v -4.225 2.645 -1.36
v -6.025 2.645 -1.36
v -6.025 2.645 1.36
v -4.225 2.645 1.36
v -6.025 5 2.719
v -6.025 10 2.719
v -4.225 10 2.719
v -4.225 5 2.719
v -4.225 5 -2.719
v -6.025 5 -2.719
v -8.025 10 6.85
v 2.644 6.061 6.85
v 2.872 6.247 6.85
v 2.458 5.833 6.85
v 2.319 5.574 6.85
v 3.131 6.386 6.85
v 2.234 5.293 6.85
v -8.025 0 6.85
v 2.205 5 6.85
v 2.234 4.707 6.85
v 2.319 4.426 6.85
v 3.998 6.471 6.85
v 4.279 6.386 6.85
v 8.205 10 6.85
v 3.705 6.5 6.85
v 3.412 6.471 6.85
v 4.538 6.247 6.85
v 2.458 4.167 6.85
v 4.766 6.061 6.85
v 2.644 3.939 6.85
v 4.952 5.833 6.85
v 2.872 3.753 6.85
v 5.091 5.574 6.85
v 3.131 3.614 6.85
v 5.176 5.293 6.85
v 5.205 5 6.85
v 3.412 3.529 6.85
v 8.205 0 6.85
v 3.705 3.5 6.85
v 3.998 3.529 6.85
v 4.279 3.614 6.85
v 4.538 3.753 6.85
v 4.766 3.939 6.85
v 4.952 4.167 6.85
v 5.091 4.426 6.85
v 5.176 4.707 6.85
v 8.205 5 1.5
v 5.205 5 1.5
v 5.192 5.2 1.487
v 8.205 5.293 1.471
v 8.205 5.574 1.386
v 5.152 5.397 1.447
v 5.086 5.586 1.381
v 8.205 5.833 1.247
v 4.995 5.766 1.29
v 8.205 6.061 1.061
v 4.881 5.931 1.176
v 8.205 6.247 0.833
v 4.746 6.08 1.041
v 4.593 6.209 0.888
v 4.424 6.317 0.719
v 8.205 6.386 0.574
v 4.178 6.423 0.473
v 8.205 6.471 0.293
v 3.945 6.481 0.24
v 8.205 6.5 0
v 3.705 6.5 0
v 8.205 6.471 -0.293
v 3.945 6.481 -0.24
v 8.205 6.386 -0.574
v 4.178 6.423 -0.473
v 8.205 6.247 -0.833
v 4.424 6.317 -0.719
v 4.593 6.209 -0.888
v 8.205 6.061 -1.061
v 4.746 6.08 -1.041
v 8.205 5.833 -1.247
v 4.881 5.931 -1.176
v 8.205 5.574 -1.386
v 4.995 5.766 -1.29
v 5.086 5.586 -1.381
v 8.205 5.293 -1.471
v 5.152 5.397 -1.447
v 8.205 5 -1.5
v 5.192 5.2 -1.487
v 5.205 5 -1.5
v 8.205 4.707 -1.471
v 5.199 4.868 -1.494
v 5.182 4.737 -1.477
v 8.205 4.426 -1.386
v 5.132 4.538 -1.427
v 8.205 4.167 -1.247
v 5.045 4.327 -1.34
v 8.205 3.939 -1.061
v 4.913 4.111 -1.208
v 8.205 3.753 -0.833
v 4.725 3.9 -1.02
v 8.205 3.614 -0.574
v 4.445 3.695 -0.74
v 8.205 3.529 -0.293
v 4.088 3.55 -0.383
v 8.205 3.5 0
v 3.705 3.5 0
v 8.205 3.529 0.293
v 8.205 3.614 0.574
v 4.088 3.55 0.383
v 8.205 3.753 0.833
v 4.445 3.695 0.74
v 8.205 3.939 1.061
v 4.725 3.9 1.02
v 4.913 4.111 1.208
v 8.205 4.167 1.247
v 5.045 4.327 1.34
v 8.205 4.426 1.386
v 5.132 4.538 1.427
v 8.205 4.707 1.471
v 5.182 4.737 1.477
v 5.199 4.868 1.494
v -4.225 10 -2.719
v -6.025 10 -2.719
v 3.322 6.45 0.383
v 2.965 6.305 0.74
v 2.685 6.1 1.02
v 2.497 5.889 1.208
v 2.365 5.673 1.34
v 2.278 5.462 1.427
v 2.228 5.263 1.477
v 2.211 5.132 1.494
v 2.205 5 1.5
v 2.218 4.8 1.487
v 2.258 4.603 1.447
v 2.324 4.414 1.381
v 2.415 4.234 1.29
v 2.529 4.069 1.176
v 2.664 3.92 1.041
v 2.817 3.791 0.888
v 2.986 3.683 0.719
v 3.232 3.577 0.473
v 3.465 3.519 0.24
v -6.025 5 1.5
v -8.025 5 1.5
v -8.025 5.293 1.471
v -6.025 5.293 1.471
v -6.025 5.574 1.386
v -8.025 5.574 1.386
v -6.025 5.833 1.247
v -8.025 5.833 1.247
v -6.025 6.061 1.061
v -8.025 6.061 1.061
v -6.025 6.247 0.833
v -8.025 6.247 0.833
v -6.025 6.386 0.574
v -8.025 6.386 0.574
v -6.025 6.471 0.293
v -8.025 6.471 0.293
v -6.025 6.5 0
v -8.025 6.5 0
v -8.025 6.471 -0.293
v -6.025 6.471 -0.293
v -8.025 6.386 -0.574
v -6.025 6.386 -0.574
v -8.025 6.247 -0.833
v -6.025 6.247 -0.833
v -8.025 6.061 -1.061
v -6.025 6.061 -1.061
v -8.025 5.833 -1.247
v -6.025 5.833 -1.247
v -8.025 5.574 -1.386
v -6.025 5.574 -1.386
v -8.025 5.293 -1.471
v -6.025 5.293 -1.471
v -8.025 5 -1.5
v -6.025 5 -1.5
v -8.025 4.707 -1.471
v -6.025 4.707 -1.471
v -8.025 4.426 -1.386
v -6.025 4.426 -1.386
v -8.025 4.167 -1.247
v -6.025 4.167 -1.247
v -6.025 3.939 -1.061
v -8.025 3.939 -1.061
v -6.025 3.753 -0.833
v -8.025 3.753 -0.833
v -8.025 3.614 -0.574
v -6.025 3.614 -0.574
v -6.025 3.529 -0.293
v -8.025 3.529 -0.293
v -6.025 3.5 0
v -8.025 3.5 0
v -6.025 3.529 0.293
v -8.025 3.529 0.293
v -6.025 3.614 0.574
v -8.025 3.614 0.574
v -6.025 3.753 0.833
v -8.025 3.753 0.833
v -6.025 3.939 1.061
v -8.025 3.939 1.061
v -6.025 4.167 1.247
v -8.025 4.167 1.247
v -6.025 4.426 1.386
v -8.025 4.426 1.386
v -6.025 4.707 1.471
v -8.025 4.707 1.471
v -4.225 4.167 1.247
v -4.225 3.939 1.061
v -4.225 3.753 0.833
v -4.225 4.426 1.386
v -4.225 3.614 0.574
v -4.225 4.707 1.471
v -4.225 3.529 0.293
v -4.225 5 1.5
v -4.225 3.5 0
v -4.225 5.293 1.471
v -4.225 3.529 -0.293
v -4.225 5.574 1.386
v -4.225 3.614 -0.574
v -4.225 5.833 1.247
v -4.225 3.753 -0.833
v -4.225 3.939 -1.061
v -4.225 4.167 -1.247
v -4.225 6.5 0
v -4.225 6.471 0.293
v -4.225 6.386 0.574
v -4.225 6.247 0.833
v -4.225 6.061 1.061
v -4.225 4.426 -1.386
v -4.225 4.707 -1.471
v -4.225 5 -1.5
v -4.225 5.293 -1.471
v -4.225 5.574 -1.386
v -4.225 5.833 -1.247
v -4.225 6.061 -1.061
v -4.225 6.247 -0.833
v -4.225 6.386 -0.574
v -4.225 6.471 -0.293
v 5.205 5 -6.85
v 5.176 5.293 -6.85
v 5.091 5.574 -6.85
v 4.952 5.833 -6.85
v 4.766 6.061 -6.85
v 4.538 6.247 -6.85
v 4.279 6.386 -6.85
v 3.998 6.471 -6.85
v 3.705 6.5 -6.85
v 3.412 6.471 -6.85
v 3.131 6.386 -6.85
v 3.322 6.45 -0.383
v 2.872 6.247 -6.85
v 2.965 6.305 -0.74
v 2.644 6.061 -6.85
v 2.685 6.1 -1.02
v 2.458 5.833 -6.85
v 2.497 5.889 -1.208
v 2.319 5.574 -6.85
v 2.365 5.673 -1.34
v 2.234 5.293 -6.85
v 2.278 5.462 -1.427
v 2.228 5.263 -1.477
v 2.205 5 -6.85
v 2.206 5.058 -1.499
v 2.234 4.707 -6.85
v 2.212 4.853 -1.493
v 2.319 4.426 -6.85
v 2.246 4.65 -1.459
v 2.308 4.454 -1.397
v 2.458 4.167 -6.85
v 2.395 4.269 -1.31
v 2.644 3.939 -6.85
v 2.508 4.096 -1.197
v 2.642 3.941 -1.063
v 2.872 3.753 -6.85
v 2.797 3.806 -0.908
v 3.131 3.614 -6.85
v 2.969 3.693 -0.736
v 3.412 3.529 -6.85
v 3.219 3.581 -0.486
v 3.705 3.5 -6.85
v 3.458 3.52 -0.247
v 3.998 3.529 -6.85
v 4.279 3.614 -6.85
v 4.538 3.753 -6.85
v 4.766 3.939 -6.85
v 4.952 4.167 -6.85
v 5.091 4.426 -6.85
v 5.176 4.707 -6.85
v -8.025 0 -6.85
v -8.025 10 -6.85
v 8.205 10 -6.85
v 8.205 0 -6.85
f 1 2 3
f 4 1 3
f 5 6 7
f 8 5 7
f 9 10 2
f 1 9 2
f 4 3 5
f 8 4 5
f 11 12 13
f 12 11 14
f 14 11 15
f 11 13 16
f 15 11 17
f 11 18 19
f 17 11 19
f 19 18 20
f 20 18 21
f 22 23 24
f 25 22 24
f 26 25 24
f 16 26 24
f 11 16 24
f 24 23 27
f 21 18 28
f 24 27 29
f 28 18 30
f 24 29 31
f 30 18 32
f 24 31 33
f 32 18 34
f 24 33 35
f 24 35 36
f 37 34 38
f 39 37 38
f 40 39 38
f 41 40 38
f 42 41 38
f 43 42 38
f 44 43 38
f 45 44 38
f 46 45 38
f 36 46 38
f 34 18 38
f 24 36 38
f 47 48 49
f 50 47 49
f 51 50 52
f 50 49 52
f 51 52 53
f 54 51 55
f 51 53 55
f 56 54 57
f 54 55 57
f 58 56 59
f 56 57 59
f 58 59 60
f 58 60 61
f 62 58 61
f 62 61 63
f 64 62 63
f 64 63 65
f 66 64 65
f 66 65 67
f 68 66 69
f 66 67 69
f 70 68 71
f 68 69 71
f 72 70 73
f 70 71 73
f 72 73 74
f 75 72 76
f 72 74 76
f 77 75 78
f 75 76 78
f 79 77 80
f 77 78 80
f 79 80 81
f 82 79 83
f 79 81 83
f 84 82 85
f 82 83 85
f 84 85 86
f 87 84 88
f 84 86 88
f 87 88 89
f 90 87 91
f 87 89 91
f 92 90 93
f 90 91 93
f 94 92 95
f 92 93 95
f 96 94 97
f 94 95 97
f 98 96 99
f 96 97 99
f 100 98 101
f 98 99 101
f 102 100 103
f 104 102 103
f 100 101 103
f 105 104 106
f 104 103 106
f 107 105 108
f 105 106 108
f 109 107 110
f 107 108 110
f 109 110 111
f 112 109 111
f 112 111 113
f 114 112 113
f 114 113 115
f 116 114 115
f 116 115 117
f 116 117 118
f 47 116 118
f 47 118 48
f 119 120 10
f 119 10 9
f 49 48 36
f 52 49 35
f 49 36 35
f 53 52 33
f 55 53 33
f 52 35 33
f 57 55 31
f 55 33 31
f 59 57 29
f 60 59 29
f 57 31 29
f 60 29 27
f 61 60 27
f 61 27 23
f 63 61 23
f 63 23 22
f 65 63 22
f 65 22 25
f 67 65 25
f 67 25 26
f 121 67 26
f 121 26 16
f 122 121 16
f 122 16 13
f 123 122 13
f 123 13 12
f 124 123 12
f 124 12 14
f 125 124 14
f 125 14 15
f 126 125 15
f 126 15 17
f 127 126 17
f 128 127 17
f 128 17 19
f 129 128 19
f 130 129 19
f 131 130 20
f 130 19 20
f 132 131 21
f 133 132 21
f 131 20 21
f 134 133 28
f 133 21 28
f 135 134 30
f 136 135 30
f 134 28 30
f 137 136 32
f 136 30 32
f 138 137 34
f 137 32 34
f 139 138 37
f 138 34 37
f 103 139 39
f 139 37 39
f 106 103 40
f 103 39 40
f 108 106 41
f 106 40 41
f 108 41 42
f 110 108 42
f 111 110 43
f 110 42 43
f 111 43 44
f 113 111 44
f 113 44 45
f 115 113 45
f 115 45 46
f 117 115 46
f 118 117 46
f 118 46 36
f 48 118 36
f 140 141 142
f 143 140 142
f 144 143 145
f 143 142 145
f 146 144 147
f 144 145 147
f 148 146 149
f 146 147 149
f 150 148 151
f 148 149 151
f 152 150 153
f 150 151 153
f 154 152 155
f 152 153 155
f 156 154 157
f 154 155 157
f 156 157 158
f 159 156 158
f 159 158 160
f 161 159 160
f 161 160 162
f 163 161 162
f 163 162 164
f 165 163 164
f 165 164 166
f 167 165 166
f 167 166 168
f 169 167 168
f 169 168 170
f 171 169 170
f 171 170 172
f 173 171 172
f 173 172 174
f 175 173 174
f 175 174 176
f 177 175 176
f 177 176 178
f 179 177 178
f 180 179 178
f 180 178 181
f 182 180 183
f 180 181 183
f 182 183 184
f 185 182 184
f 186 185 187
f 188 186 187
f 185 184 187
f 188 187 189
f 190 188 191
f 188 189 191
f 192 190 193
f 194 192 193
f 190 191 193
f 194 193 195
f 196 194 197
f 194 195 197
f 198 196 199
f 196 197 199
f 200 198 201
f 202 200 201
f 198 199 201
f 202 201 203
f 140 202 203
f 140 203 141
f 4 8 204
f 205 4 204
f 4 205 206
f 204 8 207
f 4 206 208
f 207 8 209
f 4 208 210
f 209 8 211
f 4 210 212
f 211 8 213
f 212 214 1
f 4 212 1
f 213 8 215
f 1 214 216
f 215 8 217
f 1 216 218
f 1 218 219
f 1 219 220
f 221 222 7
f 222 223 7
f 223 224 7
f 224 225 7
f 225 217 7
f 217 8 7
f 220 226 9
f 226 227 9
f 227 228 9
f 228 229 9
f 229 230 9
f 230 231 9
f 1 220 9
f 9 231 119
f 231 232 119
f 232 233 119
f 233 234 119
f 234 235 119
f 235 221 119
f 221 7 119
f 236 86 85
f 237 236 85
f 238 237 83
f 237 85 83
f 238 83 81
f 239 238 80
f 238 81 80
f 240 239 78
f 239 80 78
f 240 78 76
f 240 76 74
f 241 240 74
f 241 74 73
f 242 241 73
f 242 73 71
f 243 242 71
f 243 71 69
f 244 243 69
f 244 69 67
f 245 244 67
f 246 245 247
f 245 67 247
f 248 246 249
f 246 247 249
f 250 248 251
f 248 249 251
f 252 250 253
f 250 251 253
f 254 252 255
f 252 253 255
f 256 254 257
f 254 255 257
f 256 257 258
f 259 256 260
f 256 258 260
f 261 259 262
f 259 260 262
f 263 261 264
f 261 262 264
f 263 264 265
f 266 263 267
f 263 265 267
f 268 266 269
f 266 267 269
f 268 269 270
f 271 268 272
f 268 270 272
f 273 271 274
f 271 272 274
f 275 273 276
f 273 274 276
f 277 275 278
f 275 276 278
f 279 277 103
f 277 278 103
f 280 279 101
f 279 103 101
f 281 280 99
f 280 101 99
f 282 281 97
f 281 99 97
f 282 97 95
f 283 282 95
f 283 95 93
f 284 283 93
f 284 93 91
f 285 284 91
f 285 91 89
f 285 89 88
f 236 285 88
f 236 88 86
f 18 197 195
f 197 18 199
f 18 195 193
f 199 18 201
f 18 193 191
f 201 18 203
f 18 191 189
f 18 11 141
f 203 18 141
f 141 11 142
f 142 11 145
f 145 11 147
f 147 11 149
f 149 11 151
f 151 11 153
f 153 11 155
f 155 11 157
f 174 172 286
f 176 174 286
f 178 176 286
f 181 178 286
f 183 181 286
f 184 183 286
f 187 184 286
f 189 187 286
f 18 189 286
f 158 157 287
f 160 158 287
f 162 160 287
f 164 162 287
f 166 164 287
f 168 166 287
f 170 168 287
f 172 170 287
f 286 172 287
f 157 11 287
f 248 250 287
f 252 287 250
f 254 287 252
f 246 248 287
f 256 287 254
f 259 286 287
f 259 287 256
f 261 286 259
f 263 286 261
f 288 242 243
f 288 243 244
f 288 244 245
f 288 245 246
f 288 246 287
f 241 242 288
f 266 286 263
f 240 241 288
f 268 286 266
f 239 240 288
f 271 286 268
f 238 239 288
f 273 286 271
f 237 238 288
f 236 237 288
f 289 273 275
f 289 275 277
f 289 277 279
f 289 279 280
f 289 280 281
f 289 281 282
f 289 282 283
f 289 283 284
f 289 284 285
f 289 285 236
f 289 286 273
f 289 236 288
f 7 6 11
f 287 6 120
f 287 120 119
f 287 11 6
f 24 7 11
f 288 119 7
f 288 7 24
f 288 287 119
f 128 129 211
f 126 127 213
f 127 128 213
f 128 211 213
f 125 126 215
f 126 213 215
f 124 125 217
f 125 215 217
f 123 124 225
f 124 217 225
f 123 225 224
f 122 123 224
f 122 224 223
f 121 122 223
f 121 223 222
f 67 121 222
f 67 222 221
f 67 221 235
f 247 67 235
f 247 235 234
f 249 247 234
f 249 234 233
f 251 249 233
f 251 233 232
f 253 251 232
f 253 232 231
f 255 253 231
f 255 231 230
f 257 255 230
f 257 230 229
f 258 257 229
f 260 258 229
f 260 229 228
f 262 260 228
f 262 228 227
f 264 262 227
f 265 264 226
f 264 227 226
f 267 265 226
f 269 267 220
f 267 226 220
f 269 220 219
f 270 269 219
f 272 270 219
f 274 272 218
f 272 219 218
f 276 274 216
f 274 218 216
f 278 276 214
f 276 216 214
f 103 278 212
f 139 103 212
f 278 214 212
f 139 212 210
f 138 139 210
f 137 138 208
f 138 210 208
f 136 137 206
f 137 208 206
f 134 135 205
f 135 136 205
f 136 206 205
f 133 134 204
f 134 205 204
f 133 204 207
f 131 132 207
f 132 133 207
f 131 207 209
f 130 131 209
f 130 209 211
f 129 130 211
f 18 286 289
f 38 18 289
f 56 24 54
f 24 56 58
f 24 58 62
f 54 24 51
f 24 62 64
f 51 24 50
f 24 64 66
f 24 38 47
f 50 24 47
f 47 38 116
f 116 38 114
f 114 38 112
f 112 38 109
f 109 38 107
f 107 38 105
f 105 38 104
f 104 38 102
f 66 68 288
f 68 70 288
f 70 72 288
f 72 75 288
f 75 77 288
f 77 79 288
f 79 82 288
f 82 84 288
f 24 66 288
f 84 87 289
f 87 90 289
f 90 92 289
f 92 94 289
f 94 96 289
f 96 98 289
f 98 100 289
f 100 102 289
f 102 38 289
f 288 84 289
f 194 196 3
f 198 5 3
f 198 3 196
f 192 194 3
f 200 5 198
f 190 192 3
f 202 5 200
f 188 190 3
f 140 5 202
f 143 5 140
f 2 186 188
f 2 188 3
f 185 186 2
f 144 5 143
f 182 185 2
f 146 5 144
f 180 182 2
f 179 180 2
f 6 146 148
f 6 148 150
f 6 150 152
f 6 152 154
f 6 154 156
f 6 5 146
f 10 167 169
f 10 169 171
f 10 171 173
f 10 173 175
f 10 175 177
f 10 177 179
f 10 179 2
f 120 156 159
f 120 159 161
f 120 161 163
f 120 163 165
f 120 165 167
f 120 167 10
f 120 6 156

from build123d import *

# Parameters (mm, degrees)
SKETCH1_W           = 16.41
SKETCH1_H           = 13.7
BOSS_EXTRUDE1_DEPTH = 10
SKETCH2_R           = 1.5
CUT_EXTRUDE1_DEPTH  = 19.841762789
SKETCH3_R           = 1.5
CUT_EXTRUDE2_DEPTH  = 21.401240158
SKETCH5_W           = 0.18
SKETCH5_H           = 13.7
CUT_EXTRUDE4_DEPTH  = 15.637094145
CUT_EXTRUDE3_DEPTH  = 1.8
SKETCH6_W           = 1.8
SKETCH6_H           = 5.438639536
CUT_EXTRUDE5_DEPTH  = 5


with BuildPart() as part:
    # Sketch1 → Boss-Extrude1 (new body)
    with BuildSketch(Plane(origin=(0, 0, 0), x_dir=(1, 0, 0), z_dir=(0, 1, 0))):
        Rectangle(SKETCH1_W, SKETCH1_H)
    extrude(amount=BOSS_EXTRUDE1_DEPTH)

    # Sketch2 → Cut-Extrude1 (cut, through all)
    with BuildSketch(Plane.XY.offset(6.85)):
        with Locations((3.705, 5)):
            Circle(SKETCH2_R)
    extrude(amount=-CUT_EXTRUDE1_DEPTH, mode=Mode.SUBTRACT)

    # Sketch3 → Cut-Extrude2 (cut, through all)
    with BuildSketch(Plane.ZY.offset(8.205)):
        with Locations((0, 5)):
            Circle(SKETCH3_R)
    extrude(amount=-CUT_EXTRUDE2_DEPTH, mode=Mode.SUBTRACT)

    # Sketch5 → Cut-Extrude4 (cut, through all)
    with BuildSketch(Plane(origin=(0, 10, 0), x_dir=(1, 0, 0), z_dir=(0, 1, 0))):
        with Locations((-8.115, 0)):
            Rectangle(SKETCH5_W, SKETCH5_H)
    extrude(amount=-CUT_EXTRUDE4_DEPTH, mode=Mode.SUBTRACT)

    # Sketch4 → Cut-Extrude3 (cut)
    with BuildSketch(Plane.ZY.offset(6.025)):
        Polygon((2.719319768, 5), (1.359659884, 7.355), (-1.359659884, 7.355), (-2.719319768, 5), (-1.359659884, 2.645), (1.359659884, 2.645), align=None)
    extrude(amount=-CUT_EXTRUDE3_DEPTH, mode=Mode.SUBTRACT)

    # Sketch6 → Cut-Extrude5 (cut)
    with BuildSketch(Plane(origin=(0, 10, 0), x_dir=(1, 0, 0), z_dir=(0, 1, 0))):
        with Locations((-5.125, 0)):
            Rectangle(SKETCH6_W, SKETCH6_H)
    extrude(amount=-CUT_EXTRUDE5_DEPTH, mode=Mode.SUBTRACT)


solid = part.part
